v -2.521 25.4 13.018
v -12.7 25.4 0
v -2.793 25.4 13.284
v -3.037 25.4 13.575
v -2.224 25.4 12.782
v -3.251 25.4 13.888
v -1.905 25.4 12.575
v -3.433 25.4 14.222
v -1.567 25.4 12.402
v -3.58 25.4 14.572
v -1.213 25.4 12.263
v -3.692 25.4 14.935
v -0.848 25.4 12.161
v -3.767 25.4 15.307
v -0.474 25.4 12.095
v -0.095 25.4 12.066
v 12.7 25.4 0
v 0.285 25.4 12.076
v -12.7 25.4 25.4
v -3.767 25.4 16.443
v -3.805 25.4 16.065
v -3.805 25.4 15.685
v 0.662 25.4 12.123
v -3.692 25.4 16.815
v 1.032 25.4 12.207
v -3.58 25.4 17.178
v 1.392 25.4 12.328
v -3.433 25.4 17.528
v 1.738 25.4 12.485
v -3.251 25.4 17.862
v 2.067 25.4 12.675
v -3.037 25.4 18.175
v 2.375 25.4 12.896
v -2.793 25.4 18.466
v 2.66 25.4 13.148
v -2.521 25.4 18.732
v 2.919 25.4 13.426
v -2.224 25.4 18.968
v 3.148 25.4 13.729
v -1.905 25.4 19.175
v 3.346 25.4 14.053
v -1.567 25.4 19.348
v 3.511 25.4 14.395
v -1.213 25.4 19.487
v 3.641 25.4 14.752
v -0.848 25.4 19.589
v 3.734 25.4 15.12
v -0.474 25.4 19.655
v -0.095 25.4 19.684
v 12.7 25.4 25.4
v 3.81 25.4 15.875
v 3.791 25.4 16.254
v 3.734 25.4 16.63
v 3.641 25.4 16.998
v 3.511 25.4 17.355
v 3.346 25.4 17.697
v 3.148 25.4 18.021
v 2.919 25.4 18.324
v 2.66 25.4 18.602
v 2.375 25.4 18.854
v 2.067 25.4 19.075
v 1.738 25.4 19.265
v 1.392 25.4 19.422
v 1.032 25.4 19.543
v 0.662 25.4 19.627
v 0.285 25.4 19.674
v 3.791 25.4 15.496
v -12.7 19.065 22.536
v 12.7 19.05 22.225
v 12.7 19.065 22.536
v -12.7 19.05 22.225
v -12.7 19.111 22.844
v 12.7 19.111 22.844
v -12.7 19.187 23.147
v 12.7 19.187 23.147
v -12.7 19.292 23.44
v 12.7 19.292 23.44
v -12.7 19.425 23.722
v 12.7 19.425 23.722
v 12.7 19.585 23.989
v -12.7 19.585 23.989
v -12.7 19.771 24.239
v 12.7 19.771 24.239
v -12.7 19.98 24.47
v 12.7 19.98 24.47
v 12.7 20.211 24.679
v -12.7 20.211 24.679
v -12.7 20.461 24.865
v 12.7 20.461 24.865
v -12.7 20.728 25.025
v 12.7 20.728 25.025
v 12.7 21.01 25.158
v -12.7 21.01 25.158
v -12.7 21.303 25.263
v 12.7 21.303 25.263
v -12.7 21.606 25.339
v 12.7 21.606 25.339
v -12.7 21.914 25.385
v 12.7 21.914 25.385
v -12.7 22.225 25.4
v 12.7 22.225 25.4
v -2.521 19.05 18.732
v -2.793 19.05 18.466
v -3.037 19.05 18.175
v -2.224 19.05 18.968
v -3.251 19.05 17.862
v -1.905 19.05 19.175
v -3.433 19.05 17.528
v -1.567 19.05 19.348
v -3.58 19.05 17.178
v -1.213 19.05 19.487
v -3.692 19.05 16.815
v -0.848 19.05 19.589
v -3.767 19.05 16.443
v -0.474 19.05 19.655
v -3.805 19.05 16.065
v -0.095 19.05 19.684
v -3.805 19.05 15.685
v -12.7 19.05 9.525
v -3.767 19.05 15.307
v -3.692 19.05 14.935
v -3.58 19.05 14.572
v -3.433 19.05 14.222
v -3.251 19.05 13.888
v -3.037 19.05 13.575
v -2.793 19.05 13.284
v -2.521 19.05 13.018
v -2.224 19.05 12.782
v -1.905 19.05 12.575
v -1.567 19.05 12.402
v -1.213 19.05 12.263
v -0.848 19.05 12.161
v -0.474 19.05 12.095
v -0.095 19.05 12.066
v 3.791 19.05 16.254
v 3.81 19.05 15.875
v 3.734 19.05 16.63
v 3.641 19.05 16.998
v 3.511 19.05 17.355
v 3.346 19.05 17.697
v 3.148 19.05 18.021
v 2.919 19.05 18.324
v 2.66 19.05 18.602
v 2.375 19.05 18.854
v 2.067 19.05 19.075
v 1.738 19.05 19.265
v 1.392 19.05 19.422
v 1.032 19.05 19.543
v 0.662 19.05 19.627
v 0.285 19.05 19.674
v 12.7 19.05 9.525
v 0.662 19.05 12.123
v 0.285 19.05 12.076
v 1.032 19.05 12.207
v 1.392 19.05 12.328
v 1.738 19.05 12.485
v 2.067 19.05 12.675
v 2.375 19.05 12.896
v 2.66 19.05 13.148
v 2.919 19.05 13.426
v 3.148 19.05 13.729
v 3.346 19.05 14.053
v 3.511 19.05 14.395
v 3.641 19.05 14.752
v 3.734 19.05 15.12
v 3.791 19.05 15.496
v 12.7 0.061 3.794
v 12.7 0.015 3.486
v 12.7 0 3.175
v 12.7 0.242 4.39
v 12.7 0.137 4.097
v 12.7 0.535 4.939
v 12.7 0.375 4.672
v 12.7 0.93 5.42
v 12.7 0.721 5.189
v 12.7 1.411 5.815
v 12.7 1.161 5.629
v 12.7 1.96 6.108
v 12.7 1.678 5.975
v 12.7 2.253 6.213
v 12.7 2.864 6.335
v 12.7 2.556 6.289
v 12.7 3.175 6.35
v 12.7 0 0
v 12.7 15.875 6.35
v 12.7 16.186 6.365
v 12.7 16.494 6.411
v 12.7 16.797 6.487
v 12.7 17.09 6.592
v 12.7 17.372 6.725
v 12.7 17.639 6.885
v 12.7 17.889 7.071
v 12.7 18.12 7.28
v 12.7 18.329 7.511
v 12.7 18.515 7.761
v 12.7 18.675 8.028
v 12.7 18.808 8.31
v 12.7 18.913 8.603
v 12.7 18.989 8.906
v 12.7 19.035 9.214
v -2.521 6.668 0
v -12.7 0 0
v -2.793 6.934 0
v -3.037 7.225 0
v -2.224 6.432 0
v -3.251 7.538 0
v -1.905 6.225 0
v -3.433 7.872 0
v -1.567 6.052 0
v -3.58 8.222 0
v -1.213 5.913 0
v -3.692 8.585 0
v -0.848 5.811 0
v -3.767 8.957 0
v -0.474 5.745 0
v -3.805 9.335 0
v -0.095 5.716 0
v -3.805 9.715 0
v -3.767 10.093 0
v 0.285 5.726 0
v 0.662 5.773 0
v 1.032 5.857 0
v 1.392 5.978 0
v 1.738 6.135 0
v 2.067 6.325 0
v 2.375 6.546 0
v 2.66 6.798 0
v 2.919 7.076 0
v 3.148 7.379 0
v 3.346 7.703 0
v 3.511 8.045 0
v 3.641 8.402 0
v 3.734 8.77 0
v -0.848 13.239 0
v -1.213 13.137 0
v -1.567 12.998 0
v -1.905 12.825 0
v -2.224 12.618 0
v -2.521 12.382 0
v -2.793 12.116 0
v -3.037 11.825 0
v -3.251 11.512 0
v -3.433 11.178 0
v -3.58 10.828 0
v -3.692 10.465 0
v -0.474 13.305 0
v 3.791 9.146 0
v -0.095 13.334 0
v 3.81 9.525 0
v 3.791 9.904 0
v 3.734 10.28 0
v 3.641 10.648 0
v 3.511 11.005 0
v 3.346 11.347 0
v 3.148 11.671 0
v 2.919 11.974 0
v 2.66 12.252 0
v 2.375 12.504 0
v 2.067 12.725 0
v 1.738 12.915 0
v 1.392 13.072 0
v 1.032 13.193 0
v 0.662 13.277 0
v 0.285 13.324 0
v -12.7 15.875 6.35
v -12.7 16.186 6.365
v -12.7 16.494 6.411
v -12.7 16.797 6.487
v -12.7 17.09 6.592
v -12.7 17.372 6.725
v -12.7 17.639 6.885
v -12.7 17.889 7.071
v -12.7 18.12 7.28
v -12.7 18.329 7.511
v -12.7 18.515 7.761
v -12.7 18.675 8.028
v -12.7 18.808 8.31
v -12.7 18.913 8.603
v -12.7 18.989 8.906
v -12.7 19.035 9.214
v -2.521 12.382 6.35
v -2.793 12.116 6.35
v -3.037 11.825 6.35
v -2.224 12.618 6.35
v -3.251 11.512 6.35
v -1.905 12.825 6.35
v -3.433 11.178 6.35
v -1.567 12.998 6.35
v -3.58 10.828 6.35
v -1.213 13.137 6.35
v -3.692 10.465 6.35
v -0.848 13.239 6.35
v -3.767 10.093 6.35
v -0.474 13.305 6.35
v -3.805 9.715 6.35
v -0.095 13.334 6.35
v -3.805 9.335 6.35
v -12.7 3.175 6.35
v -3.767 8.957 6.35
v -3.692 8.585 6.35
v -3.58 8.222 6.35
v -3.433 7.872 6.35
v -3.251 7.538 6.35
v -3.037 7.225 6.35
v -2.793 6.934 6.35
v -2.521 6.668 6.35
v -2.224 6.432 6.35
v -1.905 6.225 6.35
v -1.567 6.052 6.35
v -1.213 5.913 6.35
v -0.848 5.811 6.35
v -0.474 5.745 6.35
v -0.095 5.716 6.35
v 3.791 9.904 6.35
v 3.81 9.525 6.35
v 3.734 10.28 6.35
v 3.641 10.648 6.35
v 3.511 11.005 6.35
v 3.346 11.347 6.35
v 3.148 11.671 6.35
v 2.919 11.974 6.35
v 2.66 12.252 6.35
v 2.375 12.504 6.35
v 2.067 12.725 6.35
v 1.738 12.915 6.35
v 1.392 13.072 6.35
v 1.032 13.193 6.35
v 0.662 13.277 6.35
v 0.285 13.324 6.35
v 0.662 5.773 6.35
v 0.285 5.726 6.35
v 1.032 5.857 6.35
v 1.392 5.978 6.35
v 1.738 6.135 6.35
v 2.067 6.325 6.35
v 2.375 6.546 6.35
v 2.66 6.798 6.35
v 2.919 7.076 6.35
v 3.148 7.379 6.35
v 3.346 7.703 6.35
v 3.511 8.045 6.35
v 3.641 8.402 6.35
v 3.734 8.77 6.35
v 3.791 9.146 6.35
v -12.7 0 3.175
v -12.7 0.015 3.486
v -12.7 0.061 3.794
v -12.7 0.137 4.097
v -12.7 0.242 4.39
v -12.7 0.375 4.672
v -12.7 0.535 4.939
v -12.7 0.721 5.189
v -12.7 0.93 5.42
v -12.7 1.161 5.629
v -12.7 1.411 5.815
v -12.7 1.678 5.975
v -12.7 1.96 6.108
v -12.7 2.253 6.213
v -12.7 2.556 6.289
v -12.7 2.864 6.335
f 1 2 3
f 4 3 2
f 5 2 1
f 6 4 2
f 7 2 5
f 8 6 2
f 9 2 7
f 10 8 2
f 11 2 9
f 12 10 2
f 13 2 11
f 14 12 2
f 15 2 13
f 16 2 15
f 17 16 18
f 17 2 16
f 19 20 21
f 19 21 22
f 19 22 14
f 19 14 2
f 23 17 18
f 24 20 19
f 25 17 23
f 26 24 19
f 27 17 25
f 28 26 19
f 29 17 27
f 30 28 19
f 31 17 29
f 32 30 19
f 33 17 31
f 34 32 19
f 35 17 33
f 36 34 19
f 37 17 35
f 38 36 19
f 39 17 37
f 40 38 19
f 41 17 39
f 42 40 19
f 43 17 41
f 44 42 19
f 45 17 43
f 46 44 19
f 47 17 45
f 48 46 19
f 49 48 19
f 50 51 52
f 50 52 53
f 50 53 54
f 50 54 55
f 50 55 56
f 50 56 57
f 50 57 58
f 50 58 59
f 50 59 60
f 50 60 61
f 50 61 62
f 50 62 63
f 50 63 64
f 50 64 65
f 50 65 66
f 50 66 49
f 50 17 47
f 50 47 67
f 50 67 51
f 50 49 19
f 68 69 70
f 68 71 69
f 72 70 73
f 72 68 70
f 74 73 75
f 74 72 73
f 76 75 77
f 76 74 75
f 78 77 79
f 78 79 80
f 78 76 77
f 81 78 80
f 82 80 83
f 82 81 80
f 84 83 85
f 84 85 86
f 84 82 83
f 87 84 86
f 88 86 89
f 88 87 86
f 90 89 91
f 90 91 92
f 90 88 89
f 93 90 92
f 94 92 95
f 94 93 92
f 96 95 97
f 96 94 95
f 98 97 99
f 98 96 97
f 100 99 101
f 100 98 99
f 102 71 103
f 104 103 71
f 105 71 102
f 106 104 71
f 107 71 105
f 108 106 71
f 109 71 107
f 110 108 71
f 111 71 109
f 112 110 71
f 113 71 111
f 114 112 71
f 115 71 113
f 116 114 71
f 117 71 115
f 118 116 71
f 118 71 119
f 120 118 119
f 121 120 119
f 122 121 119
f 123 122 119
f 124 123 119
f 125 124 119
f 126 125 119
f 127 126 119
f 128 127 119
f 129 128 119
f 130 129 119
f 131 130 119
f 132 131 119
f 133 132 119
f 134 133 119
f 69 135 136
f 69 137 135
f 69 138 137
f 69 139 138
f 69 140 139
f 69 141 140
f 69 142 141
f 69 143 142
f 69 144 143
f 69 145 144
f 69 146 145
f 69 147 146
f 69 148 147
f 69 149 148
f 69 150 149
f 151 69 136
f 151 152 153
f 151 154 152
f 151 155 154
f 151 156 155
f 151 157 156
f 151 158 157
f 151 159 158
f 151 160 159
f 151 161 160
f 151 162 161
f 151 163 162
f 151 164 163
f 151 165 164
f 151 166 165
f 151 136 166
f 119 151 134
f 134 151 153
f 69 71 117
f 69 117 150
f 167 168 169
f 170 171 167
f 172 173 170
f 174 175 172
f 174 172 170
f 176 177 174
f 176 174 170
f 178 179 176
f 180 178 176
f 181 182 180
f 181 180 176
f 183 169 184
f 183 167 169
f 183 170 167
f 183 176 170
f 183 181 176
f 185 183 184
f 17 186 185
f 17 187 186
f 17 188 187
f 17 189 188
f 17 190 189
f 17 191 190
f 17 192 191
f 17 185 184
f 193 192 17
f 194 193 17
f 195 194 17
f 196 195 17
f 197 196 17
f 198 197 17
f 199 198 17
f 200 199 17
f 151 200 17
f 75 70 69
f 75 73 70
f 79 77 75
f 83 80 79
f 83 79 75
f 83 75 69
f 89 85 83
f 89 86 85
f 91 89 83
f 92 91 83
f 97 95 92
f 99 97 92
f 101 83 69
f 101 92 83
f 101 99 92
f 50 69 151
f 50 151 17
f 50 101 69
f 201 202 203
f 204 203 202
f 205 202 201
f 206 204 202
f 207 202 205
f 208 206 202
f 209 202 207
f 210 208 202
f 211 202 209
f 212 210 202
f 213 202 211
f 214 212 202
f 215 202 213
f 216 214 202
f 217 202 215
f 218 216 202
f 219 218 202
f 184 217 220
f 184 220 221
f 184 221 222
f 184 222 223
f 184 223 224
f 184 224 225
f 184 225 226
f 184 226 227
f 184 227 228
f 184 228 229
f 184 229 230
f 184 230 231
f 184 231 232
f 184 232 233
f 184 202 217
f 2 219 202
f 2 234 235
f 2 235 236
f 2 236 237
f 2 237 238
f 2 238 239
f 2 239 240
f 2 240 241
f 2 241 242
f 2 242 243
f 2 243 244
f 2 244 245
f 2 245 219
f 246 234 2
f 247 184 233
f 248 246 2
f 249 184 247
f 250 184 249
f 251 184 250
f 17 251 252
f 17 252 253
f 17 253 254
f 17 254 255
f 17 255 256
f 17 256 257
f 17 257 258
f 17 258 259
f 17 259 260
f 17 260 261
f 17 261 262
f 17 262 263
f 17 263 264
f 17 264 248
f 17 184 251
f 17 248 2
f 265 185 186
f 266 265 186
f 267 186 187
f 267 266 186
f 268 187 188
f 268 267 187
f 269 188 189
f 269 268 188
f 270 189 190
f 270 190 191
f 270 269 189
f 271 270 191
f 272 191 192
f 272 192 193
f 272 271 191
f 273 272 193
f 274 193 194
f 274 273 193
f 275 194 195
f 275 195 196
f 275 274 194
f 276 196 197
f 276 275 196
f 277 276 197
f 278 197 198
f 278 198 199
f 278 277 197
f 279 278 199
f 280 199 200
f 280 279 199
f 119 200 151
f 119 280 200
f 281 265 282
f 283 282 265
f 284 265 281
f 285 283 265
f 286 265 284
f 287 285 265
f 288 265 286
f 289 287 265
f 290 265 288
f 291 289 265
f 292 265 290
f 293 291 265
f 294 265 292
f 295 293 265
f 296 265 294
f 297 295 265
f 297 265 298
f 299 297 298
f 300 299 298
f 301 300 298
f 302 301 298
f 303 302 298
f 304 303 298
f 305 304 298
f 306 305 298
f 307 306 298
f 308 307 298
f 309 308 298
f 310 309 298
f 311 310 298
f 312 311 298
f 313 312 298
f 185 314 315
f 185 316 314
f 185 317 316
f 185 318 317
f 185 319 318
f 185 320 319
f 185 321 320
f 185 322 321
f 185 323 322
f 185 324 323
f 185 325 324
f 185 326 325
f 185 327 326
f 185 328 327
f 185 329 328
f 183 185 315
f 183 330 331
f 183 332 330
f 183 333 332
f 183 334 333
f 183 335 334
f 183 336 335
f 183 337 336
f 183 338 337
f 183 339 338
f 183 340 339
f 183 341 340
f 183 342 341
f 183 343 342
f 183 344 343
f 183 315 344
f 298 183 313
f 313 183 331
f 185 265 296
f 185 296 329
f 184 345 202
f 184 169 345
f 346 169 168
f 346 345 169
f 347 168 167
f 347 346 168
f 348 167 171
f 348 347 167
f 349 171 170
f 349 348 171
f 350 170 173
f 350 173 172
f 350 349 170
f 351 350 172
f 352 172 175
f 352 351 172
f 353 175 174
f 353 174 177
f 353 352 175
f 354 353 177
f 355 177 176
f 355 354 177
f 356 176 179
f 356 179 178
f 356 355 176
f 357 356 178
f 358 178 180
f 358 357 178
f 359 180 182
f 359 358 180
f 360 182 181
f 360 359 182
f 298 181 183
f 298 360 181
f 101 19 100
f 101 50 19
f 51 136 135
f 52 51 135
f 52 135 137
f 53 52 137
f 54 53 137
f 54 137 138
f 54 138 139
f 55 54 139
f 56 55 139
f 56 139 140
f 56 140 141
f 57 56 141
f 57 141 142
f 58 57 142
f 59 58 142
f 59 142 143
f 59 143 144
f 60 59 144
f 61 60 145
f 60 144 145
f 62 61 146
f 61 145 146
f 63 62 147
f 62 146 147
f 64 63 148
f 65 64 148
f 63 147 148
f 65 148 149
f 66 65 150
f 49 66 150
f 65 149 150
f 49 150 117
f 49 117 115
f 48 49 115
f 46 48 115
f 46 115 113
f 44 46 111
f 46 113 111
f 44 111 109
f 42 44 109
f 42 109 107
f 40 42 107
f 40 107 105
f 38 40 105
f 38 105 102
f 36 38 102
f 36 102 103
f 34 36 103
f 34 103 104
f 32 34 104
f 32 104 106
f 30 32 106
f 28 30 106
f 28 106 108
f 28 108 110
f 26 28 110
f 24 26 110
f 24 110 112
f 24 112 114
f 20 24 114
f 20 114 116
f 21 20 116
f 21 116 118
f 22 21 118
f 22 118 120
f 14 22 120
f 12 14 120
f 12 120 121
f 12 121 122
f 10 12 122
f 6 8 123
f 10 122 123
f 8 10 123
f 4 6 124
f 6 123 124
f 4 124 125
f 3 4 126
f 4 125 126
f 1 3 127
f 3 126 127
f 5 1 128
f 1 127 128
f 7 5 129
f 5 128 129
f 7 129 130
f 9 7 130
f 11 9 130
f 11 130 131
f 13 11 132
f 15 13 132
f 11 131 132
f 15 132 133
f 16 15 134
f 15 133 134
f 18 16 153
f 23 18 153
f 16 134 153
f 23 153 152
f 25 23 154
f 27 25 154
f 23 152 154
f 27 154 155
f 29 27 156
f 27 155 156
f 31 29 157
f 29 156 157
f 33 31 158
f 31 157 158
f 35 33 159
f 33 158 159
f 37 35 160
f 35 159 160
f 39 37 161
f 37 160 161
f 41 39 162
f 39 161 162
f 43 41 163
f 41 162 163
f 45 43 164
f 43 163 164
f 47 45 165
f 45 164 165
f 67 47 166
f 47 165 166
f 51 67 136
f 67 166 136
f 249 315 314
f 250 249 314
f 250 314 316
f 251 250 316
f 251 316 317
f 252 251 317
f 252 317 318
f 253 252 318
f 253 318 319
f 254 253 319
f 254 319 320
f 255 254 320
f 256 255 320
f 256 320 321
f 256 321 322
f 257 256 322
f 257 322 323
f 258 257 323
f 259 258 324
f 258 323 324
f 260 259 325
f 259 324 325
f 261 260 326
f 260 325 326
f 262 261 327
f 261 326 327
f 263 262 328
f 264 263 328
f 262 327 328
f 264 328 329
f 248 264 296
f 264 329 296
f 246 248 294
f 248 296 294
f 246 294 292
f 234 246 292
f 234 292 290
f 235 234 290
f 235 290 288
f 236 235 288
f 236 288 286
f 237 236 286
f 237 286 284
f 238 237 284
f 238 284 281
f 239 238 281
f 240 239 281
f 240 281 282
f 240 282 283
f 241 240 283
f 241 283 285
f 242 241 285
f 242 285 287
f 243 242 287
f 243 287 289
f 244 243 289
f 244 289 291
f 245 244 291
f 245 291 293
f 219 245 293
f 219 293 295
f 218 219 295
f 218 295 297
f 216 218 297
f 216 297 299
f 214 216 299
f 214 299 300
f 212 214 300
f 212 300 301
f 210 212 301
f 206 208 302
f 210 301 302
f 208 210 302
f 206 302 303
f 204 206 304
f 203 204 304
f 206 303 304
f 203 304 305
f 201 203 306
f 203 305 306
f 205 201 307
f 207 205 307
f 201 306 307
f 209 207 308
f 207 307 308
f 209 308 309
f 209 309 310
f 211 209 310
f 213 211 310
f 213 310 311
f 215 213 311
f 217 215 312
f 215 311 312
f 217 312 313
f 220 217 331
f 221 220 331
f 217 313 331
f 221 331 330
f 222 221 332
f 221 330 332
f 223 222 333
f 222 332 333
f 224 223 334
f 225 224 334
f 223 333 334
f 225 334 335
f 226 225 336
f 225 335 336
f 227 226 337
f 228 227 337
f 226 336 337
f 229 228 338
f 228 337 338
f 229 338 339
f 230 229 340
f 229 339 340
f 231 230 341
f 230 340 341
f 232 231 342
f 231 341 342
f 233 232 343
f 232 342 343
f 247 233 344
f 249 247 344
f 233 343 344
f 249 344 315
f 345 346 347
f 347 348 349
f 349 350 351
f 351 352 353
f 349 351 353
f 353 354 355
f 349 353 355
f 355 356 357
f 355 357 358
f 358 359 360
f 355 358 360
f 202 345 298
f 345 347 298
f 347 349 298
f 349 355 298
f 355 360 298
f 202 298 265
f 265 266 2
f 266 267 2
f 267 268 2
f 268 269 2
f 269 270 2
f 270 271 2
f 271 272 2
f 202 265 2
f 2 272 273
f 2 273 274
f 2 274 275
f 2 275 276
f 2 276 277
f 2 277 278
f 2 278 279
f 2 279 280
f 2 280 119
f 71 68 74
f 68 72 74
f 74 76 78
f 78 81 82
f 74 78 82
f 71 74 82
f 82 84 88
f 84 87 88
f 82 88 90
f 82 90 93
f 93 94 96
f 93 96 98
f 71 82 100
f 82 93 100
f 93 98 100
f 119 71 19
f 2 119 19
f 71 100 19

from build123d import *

# Parameters (mm, degrees)
F1_DEPTH = 12.7
F2_R     = 3.175
F3_R     = 3.81
F4_DEPTH = 25.4
F5_R     = 3.81
F6_DEPTH = 25.4


with BuildPart() as f1:
    # F0 (on Right) → F1 (new body, symmetric)
    with BuildSketch(Plane.YZ):
        Polygon((0, 6.35), (0, 0), (25.4, 0), (25.4, 25.4), (19.05, 25.4), (19.05, 6.35), align=None)
    extrude(amount=F1_DEPTH, both=True)

    # F2
    f2_edges = [f1.edges().sort_by_distance(p)[0] for p in [
        (0, 0, 6.35),
        (0, 19.05, 6.35),
        (0, 19.05, 25.4),
    ]]
    fillet(f2_edges, radius=F2_R)

    # F3 (on face) → F4 (cut)
    with BuildSketch(Plane.XY.offset(6.35)):
        with Locations((0, 9.525)):
            Circle(F3_R)
    extrude(amount=-F4_DEPTH, mode=Mode.SUBTRACT)

    # F5 (on face) → F6 (cut)
    with BuildSketch(Plane.XZ.offset(-19.05)):
        with Locations((0, 15.875)):
            Circle(F5_R)
    extrude(amount=-F6_DEPTH, mode=Mode.SUBTRACT)


solid = f1.part
